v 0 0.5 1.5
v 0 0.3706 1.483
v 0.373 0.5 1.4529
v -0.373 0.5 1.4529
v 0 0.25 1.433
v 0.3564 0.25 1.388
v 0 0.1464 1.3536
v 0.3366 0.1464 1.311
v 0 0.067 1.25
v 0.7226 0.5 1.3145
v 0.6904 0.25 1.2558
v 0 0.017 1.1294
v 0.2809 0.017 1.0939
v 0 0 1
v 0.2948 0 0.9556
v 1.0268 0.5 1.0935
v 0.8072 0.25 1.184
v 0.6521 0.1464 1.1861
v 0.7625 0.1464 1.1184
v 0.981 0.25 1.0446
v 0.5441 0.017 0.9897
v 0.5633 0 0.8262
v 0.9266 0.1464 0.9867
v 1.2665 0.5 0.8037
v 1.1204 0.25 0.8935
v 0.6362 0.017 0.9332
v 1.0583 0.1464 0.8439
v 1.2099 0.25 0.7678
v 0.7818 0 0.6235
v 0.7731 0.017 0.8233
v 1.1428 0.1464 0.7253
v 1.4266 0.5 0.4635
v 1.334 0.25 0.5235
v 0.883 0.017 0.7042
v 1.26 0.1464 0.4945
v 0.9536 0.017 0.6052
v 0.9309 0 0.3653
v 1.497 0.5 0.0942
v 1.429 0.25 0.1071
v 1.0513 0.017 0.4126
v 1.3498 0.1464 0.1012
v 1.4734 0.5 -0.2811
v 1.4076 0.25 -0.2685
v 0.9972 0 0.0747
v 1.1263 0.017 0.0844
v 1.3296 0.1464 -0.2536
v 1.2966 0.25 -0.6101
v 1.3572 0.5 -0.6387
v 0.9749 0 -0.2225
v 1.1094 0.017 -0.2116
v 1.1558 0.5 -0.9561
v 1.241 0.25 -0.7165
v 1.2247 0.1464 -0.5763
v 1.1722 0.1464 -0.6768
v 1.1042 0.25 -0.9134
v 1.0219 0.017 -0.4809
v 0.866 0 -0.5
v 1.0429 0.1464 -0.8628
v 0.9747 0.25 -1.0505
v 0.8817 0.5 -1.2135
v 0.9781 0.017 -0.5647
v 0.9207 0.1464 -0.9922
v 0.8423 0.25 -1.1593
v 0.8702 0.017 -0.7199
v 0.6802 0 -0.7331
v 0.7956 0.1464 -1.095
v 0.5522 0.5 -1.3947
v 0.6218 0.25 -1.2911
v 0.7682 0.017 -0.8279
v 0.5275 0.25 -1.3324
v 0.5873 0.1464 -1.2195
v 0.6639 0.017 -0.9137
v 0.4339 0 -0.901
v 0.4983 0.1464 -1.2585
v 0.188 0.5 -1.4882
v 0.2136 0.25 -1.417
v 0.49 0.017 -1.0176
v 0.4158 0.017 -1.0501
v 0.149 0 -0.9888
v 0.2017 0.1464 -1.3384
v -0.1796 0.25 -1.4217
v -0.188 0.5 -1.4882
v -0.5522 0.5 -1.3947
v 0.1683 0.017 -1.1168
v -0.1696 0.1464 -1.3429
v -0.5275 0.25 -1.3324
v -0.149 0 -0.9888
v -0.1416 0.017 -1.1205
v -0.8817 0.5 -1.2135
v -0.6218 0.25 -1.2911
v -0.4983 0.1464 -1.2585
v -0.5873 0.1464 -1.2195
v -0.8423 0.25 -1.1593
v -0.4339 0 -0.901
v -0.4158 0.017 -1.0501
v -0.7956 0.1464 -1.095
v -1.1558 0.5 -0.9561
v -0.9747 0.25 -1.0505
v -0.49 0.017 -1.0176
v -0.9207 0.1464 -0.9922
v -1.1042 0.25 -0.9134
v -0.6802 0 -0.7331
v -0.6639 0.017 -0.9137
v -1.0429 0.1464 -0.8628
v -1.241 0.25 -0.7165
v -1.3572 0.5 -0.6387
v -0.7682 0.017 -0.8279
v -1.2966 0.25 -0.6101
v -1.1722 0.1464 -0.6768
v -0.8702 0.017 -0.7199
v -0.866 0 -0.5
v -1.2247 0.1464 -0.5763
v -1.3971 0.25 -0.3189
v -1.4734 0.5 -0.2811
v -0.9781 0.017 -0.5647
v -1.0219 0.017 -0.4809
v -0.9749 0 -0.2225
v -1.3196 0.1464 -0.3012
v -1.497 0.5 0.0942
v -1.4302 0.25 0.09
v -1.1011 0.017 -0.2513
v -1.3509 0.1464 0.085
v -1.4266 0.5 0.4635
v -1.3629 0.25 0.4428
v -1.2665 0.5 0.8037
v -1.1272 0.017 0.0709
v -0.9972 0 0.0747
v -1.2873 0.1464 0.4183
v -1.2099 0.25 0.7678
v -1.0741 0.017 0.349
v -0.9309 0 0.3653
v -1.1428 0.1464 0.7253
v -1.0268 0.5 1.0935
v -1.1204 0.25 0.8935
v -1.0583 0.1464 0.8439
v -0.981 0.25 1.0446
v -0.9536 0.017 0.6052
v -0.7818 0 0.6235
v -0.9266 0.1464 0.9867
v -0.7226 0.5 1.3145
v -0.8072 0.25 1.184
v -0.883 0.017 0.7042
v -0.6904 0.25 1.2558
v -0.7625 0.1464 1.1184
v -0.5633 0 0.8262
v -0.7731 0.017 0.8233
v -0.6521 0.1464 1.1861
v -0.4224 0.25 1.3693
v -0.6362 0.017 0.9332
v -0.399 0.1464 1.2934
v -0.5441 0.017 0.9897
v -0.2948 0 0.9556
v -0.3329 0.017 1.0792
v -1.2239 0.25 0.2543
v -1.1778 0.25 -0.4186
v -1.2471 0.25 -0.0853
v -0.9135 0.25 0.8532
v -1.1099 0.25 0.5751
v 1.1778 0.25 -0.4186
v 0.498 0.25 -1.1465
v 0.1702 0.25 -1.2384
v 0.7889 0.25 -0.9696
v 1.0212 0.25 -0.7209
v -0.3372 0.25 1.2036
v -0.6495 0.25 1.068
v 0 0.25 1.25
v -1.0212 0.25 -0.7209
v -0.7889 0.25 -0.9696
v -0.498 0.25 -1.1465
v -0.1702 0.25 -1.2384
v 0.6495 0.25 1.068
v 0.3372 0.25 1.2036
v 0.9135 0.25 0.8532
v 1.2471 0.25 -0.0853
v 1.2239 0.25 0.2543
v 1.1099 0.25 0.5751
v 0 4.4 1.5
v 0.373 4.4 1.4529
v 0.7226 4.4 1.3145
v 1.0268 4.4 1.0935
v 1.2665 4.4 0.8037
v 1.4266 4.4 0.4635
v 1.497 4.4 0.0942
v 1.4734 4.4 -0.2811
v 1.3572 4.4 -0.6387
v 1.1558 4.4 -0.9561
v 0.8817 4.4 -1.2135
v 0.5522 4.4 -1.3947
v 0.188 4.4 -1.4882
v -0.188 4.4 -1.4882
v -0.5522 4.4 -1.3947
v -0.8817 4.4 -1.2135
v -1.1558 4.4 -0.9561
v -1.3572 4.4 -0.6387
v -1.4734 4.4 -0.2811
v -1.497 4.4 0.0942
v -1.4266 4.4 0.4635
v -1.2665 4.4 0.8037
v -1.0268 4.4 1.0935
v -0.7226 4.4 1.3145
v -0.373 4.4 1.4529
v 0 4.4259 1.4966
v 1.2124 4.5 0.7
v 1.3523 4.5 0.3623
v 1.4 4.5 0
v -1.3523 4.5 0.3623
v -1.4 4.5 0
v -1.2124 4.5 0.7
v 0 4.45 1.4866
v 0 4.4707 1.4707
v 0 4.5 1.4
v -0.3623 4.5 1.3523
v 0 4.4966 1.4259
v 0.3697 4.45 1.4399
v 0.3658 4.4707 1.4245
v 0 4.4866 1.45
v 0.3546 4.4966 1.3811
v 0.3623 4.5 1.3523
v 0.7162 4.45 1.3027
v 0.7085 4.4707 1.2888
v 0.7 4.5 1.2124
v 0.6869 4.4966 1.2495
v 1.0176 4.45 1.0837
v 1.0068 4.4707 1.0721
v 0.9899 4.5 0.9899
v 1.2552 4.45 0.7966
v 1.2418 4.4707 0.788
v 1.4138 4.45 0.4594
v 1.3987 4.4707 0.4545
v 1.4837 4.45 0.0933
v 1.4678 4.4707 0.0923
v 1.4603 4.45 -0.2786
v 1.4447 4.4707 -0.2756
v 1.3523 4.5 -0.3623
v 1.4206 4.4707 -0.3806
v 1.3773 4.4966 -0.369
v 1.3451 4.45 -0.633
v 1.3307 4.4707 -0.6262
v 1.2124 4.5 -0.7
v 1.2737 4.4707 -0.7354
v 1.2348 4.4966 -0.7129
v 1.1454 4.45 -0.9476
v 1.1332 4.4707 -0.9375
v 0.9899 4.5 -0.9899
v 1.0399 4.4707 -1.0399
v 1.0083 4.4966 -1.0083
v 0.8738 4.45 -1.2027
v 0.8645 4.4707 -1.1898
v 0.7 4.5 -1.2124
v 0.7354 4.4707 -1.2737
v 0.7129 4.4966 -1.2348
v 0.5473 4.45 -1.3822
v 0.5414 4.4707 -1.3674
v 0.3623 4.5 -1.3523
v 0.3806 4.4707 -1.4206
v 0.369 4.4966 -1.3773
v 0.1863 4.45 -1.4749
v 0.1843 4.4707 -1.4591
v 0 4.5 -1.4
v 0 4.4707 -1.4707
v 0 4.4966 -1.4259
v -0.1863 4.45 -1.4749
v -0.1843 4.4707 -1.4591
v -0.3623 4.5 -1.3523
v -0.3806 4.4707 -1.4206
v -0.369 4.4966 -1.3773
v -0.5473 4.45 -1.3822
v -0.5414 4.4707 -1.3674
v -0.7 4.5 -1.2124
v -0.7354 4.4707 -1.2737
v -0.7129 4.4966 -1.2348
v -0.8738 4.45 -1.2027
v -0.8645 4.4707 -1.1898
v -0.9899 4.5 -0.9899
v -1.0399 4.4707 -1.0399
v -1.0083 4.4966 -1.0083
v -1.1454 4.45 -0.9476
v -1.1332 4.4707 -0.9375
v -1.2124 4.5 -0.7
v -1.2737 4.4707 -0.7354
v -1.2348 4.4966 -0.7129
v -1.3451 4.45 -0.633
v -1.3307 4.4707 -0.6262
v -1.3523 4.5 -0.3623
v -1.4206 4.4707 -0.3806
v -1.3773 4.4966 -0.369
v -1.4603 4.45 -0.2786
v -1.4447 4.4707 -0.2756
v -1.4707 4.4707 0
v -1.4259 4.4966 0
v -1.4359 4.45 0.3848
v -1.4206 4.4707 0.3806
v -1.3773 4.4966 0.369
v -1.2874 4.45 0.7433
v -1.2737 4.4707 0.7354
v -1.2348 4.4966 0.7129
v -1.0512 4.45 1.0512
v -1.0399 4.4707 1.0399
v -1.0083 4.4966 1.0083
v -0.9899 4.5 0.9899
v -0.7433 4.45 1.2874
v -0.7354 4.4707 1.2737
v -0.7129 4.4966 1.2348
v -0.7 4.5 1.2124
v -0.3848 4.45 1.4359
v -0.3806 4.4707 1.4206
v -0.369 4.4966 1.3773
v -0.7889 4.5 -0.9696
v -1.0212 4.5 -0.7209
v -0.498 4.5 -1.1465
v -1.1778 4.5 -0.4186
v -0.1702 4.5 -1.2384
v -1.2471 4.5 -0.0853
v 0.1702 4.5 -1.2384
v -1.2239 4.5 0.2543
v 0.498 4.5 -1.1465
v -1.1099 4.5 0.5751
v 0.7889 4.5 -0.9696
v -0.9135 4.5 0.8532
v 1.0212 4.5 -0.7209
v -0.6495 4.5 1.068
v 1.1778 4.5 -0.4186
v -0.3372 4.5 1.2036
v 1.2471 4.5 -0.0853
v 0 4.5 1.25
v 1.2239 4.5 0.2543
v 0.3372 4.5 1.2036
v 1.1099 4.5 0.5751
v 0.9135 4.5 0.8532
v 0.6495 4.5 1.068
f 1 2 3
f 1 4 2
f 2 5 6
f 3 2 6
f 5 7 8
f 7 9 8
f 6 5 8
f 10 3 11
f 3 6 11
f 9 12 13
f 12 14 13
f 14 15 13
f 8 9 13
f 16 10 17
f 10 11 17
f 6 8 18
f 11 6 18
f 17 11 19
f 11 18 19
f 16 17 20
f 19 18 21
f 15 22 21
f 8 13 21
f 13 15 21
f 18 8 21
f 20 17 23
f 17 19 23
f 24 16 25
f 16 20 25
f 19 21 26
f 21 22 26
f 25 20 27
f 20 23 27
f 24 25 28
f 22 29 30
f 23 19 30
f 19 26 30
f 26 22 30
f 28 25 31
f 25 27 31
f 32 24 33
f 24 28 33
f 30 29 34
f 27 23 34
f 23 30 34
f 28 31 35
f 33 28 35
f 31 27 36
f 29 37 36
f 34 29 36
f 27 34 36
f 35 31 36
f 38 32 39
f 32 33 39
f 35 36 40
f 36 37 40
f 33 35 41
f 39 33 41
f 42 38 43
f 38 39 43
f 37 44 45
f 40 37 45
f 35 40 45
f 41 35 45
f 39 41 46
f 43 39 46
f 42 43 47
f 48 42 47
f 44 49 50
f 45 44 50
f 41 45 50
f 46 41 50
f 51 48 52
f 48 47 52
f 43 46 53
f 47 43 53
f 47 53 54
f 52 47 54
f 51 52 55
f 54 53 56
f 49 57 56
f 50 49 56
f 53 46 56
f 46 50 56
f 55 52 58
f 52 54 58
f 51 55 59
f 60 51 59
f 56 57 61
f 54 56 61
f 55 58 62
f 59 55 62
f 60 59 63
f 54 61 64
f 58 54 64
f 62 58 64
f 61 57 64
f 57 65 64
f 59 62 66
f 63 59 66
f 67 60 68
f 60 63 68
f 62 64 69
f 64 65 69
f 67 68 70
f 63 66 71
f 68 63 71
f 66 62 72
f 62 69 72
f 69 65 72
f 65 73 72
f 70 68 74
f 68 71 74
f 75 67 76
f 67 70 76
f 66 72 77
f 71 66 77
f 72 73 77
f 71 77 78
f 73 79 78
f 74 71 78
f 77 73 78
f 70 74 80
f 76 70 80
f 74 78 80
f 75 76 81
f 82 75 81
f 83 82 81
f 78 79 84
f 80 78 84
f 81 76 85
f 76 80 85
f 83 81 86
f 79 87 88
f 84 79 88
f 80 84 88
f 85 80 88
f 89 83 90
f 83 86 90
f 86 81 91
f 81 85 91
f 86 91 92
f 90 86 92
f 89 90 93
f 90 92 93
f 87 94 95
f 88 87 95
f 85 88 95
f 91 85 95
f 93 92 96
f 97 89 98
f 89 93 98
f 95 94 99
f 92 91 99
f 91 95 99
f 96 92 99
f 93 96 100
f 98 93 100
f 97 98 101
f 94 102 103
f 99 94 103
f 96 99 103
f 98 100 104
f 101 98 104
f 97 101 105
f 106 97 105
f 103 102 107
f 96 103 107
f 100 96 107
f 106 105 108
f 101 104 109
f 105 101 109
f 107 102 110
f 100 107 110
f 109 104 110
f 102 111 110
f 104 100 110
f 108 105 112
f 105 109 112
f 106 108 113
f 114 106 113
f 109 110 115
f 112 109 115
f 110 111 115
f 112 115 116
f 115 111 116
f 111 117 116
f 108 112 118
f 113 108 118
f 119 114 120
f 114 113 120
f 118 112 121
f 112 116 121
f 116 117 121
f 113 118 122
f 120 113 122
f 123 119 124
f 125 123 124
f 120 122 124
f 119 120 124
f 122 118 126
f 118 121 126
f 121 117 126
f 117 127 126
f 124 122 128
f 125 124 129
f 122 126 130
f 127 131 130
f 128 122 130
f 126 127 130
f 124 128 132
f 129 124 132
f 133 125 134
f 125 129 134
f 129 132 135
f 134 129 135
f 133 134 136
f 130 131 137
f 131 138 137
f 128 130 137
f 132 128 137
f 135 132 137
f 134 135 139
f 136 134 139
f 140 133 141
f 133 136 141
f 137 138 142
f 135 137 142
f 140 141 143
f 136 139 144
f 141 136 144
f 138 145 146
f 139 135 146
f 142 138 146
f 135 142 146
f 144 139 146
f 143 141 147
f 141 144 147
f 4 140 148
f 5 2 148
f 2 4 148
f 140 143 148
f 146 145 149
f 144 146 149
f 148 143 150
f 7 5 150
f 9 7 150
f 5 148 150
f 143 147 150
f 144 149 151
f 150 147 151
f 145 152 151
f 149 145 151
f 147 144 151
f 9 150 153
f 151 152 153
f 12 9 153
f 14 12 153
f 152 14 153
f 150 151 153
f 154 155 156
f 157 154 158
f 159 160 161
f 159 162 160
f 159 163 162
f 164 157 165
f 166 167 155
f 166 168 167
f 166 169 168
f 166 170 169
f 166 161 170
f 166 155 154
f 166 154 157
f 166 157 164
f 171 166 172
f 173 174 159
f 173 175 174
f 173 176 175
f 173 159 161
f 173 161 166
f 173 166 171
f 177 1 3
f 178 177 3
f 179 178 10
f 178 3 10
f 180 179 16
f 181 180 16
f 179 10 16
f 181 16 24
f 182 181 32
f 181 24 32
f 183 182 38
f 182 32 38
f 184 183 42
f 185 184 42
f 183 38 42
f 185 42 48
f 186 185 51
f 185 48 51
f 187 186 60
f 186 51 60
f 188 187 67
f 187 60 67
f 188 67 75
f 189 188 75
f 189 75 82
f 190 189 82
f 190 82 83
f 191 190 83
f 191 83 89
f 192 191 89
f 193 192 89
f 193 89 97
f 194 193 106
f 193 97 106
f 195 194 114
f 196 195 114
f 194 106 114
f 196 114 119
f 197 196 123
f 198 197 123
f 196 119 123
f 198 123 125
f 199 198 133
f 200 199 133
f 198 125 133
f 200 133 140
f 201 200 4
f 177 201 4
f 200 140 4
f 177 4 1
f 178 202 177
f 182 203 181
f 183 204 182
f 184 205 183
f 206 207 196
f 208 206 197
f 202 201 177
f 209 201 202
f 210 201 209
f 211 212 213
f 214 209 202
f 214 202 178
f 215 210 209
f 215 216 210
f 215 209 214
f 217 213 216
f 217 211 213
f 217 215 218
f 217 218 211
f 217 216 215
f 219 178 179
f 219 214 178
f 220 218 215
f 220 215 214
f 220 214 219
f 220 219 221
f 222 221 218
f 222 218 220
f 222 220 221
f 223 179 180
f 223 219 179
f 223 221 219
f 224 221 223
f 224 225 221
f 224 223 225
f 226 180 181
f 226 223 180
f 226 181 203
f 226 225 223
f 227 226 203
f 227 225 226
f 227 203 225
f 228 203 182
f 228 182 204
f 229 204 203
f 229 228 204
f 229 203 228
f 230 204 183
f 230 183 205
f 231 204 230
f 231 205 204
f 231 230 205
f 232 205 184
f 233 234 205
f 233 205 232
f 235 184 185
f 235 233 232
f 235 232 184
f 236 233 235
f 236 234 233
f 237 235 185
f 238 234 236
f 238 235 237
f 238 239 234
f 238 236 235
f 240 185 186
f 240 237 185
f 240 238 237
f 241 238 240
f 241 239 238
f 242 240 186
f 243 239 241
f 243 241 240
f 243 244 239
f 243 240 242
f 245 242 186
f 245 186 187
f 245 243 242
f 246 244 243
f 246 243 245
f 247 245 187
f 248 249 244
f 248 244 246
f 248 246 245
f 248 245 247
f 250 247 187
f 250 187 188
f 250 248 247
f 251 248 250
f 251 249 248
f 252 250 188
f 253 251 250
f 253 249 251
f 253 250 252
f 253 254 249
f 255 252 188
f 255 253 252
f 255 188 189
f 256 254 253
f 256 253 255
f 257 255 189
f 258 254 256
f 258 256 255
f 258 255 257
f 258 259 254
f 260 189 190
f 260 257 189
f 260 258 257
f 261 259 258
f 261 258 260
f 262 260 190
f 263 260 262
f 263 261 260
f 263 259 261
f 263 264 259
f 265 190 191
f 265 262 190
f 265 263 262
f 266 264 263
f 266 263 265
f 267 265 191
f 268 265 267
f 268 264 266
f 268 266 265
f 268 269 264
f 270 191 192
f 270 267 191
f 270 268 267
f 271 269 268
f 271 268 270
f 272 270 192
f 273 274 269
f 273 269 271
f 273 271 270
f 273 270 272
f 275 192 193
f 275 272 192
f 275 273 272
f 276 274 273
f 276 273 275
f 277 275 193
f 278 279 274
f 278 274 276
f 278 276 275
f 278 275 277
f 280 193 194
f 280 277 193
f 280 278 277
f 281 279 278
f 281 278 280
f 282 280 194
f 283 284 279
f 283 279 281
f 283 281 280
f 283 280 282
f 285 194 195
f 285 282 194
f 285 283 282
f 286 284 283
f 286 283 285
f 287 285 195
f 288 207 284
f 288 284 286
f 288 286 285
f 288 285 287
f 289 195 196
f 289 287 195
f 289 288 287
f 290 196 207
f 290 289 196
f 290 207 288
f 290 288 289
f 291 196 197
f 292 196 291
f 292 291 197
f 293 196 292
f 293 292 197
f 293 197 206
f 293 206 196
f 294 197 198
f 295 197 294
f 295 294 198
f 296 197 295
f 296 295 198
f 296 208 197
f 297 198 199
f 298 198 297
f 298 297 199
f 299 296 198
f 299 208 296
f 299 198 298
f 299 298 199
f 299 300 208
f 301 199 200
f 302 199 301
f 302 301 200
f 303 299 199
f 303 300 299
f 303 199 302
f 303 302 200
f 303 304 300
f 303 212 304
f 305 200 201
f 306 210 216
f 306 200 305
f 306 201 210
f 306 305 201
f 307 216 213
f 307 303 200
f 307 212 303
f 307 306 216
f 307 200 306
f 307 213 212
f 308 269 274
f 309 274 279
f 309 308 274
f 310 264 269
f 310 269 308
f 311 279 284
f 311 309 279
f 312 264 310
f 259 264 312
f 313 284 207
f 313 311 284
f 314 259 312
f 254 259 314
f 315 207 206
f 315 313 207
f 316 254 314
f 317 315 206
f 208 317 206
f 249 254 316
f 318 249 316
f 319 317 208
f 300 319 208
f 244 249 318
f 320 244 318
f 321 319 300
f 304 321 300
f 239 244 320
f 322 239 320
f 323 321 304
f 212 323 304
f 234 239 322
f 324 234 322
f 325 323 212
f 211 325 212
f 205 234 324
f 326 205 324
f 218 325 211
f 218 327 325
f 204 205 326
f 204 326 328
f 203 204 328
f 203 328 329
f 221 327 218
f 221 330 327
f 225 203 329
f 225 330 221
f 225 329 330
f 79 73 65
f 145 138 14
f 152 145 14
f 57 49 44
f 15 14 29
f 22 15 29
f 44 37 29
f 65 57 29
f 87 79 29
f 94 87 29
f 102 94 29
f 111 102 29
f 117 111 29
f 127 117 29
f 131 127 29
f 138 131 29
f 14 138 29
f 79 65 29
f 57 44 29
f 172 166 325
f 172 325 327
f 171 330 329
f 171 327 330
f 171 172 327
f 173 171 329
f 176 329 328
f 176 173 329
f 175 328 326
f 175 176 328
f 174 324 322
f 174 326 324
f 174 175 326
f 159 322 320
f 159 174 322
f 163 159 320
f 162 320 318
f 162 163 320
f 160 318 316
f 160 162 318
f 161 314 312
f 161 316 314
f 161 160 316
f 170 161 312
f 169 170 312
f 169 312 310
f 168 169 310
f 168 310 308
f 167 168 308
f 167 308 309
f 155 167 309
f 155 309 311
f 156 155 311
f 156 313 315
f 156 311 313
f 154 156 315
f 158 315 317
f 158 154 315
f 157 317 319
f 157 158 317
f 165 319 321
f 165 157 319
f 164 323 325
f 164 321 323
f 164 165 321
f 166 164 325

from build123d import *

# Parameters (mm, degrees)
CROQUIS2_R              = 1.5
SALIENTE_EXTRUIR1_DEPTH = 4.5
VACIADO1_T              = -0.25
REDONDEO1_R             = 0.1
REDONDEO2_R             = 0.5


with BuildPart() as part:
    # Croquis2 → Saliente-Extruir1 (new body)
    with BuildSketch(Plane(origin=(0, 0, 0), x_dir=(1, 0, 0), z_dir=(0, 1, 0))):
        with Locations(Location((0, 0, 0), (0, 0, 270))):
            Circle(CROQUIS2_R)
    extrude(amount=SALIENTE_EXTRUIR1_DEPTH)

    # Vaciado1
    vaciado1_openings = [part.faces().sort_by_distance(p)[0] for p in [
        (0, 4.5, 0),
    ]]
    offset(amount=VACIADO1_T, openings=vaciado1_openings, kind=Kind.INTERSECTION)

    # Redondeo1
    redondeo1_edges = [part.edges().sort_by_distance(p)[0] for p in [
        (0, 4.5, -1.5),
    ]]
    fillet(redondeo1_edges, radius=REDONDEO1_R)

    # Redondeo2
    redondeo2_edges = [part.edges().sort_by_distance(p)[0] for p in [
        (0, 0, -1.5),
    ]]
    fillet(redondeo2_edges, radius=REDONDEO2_R)


solid = part.part
